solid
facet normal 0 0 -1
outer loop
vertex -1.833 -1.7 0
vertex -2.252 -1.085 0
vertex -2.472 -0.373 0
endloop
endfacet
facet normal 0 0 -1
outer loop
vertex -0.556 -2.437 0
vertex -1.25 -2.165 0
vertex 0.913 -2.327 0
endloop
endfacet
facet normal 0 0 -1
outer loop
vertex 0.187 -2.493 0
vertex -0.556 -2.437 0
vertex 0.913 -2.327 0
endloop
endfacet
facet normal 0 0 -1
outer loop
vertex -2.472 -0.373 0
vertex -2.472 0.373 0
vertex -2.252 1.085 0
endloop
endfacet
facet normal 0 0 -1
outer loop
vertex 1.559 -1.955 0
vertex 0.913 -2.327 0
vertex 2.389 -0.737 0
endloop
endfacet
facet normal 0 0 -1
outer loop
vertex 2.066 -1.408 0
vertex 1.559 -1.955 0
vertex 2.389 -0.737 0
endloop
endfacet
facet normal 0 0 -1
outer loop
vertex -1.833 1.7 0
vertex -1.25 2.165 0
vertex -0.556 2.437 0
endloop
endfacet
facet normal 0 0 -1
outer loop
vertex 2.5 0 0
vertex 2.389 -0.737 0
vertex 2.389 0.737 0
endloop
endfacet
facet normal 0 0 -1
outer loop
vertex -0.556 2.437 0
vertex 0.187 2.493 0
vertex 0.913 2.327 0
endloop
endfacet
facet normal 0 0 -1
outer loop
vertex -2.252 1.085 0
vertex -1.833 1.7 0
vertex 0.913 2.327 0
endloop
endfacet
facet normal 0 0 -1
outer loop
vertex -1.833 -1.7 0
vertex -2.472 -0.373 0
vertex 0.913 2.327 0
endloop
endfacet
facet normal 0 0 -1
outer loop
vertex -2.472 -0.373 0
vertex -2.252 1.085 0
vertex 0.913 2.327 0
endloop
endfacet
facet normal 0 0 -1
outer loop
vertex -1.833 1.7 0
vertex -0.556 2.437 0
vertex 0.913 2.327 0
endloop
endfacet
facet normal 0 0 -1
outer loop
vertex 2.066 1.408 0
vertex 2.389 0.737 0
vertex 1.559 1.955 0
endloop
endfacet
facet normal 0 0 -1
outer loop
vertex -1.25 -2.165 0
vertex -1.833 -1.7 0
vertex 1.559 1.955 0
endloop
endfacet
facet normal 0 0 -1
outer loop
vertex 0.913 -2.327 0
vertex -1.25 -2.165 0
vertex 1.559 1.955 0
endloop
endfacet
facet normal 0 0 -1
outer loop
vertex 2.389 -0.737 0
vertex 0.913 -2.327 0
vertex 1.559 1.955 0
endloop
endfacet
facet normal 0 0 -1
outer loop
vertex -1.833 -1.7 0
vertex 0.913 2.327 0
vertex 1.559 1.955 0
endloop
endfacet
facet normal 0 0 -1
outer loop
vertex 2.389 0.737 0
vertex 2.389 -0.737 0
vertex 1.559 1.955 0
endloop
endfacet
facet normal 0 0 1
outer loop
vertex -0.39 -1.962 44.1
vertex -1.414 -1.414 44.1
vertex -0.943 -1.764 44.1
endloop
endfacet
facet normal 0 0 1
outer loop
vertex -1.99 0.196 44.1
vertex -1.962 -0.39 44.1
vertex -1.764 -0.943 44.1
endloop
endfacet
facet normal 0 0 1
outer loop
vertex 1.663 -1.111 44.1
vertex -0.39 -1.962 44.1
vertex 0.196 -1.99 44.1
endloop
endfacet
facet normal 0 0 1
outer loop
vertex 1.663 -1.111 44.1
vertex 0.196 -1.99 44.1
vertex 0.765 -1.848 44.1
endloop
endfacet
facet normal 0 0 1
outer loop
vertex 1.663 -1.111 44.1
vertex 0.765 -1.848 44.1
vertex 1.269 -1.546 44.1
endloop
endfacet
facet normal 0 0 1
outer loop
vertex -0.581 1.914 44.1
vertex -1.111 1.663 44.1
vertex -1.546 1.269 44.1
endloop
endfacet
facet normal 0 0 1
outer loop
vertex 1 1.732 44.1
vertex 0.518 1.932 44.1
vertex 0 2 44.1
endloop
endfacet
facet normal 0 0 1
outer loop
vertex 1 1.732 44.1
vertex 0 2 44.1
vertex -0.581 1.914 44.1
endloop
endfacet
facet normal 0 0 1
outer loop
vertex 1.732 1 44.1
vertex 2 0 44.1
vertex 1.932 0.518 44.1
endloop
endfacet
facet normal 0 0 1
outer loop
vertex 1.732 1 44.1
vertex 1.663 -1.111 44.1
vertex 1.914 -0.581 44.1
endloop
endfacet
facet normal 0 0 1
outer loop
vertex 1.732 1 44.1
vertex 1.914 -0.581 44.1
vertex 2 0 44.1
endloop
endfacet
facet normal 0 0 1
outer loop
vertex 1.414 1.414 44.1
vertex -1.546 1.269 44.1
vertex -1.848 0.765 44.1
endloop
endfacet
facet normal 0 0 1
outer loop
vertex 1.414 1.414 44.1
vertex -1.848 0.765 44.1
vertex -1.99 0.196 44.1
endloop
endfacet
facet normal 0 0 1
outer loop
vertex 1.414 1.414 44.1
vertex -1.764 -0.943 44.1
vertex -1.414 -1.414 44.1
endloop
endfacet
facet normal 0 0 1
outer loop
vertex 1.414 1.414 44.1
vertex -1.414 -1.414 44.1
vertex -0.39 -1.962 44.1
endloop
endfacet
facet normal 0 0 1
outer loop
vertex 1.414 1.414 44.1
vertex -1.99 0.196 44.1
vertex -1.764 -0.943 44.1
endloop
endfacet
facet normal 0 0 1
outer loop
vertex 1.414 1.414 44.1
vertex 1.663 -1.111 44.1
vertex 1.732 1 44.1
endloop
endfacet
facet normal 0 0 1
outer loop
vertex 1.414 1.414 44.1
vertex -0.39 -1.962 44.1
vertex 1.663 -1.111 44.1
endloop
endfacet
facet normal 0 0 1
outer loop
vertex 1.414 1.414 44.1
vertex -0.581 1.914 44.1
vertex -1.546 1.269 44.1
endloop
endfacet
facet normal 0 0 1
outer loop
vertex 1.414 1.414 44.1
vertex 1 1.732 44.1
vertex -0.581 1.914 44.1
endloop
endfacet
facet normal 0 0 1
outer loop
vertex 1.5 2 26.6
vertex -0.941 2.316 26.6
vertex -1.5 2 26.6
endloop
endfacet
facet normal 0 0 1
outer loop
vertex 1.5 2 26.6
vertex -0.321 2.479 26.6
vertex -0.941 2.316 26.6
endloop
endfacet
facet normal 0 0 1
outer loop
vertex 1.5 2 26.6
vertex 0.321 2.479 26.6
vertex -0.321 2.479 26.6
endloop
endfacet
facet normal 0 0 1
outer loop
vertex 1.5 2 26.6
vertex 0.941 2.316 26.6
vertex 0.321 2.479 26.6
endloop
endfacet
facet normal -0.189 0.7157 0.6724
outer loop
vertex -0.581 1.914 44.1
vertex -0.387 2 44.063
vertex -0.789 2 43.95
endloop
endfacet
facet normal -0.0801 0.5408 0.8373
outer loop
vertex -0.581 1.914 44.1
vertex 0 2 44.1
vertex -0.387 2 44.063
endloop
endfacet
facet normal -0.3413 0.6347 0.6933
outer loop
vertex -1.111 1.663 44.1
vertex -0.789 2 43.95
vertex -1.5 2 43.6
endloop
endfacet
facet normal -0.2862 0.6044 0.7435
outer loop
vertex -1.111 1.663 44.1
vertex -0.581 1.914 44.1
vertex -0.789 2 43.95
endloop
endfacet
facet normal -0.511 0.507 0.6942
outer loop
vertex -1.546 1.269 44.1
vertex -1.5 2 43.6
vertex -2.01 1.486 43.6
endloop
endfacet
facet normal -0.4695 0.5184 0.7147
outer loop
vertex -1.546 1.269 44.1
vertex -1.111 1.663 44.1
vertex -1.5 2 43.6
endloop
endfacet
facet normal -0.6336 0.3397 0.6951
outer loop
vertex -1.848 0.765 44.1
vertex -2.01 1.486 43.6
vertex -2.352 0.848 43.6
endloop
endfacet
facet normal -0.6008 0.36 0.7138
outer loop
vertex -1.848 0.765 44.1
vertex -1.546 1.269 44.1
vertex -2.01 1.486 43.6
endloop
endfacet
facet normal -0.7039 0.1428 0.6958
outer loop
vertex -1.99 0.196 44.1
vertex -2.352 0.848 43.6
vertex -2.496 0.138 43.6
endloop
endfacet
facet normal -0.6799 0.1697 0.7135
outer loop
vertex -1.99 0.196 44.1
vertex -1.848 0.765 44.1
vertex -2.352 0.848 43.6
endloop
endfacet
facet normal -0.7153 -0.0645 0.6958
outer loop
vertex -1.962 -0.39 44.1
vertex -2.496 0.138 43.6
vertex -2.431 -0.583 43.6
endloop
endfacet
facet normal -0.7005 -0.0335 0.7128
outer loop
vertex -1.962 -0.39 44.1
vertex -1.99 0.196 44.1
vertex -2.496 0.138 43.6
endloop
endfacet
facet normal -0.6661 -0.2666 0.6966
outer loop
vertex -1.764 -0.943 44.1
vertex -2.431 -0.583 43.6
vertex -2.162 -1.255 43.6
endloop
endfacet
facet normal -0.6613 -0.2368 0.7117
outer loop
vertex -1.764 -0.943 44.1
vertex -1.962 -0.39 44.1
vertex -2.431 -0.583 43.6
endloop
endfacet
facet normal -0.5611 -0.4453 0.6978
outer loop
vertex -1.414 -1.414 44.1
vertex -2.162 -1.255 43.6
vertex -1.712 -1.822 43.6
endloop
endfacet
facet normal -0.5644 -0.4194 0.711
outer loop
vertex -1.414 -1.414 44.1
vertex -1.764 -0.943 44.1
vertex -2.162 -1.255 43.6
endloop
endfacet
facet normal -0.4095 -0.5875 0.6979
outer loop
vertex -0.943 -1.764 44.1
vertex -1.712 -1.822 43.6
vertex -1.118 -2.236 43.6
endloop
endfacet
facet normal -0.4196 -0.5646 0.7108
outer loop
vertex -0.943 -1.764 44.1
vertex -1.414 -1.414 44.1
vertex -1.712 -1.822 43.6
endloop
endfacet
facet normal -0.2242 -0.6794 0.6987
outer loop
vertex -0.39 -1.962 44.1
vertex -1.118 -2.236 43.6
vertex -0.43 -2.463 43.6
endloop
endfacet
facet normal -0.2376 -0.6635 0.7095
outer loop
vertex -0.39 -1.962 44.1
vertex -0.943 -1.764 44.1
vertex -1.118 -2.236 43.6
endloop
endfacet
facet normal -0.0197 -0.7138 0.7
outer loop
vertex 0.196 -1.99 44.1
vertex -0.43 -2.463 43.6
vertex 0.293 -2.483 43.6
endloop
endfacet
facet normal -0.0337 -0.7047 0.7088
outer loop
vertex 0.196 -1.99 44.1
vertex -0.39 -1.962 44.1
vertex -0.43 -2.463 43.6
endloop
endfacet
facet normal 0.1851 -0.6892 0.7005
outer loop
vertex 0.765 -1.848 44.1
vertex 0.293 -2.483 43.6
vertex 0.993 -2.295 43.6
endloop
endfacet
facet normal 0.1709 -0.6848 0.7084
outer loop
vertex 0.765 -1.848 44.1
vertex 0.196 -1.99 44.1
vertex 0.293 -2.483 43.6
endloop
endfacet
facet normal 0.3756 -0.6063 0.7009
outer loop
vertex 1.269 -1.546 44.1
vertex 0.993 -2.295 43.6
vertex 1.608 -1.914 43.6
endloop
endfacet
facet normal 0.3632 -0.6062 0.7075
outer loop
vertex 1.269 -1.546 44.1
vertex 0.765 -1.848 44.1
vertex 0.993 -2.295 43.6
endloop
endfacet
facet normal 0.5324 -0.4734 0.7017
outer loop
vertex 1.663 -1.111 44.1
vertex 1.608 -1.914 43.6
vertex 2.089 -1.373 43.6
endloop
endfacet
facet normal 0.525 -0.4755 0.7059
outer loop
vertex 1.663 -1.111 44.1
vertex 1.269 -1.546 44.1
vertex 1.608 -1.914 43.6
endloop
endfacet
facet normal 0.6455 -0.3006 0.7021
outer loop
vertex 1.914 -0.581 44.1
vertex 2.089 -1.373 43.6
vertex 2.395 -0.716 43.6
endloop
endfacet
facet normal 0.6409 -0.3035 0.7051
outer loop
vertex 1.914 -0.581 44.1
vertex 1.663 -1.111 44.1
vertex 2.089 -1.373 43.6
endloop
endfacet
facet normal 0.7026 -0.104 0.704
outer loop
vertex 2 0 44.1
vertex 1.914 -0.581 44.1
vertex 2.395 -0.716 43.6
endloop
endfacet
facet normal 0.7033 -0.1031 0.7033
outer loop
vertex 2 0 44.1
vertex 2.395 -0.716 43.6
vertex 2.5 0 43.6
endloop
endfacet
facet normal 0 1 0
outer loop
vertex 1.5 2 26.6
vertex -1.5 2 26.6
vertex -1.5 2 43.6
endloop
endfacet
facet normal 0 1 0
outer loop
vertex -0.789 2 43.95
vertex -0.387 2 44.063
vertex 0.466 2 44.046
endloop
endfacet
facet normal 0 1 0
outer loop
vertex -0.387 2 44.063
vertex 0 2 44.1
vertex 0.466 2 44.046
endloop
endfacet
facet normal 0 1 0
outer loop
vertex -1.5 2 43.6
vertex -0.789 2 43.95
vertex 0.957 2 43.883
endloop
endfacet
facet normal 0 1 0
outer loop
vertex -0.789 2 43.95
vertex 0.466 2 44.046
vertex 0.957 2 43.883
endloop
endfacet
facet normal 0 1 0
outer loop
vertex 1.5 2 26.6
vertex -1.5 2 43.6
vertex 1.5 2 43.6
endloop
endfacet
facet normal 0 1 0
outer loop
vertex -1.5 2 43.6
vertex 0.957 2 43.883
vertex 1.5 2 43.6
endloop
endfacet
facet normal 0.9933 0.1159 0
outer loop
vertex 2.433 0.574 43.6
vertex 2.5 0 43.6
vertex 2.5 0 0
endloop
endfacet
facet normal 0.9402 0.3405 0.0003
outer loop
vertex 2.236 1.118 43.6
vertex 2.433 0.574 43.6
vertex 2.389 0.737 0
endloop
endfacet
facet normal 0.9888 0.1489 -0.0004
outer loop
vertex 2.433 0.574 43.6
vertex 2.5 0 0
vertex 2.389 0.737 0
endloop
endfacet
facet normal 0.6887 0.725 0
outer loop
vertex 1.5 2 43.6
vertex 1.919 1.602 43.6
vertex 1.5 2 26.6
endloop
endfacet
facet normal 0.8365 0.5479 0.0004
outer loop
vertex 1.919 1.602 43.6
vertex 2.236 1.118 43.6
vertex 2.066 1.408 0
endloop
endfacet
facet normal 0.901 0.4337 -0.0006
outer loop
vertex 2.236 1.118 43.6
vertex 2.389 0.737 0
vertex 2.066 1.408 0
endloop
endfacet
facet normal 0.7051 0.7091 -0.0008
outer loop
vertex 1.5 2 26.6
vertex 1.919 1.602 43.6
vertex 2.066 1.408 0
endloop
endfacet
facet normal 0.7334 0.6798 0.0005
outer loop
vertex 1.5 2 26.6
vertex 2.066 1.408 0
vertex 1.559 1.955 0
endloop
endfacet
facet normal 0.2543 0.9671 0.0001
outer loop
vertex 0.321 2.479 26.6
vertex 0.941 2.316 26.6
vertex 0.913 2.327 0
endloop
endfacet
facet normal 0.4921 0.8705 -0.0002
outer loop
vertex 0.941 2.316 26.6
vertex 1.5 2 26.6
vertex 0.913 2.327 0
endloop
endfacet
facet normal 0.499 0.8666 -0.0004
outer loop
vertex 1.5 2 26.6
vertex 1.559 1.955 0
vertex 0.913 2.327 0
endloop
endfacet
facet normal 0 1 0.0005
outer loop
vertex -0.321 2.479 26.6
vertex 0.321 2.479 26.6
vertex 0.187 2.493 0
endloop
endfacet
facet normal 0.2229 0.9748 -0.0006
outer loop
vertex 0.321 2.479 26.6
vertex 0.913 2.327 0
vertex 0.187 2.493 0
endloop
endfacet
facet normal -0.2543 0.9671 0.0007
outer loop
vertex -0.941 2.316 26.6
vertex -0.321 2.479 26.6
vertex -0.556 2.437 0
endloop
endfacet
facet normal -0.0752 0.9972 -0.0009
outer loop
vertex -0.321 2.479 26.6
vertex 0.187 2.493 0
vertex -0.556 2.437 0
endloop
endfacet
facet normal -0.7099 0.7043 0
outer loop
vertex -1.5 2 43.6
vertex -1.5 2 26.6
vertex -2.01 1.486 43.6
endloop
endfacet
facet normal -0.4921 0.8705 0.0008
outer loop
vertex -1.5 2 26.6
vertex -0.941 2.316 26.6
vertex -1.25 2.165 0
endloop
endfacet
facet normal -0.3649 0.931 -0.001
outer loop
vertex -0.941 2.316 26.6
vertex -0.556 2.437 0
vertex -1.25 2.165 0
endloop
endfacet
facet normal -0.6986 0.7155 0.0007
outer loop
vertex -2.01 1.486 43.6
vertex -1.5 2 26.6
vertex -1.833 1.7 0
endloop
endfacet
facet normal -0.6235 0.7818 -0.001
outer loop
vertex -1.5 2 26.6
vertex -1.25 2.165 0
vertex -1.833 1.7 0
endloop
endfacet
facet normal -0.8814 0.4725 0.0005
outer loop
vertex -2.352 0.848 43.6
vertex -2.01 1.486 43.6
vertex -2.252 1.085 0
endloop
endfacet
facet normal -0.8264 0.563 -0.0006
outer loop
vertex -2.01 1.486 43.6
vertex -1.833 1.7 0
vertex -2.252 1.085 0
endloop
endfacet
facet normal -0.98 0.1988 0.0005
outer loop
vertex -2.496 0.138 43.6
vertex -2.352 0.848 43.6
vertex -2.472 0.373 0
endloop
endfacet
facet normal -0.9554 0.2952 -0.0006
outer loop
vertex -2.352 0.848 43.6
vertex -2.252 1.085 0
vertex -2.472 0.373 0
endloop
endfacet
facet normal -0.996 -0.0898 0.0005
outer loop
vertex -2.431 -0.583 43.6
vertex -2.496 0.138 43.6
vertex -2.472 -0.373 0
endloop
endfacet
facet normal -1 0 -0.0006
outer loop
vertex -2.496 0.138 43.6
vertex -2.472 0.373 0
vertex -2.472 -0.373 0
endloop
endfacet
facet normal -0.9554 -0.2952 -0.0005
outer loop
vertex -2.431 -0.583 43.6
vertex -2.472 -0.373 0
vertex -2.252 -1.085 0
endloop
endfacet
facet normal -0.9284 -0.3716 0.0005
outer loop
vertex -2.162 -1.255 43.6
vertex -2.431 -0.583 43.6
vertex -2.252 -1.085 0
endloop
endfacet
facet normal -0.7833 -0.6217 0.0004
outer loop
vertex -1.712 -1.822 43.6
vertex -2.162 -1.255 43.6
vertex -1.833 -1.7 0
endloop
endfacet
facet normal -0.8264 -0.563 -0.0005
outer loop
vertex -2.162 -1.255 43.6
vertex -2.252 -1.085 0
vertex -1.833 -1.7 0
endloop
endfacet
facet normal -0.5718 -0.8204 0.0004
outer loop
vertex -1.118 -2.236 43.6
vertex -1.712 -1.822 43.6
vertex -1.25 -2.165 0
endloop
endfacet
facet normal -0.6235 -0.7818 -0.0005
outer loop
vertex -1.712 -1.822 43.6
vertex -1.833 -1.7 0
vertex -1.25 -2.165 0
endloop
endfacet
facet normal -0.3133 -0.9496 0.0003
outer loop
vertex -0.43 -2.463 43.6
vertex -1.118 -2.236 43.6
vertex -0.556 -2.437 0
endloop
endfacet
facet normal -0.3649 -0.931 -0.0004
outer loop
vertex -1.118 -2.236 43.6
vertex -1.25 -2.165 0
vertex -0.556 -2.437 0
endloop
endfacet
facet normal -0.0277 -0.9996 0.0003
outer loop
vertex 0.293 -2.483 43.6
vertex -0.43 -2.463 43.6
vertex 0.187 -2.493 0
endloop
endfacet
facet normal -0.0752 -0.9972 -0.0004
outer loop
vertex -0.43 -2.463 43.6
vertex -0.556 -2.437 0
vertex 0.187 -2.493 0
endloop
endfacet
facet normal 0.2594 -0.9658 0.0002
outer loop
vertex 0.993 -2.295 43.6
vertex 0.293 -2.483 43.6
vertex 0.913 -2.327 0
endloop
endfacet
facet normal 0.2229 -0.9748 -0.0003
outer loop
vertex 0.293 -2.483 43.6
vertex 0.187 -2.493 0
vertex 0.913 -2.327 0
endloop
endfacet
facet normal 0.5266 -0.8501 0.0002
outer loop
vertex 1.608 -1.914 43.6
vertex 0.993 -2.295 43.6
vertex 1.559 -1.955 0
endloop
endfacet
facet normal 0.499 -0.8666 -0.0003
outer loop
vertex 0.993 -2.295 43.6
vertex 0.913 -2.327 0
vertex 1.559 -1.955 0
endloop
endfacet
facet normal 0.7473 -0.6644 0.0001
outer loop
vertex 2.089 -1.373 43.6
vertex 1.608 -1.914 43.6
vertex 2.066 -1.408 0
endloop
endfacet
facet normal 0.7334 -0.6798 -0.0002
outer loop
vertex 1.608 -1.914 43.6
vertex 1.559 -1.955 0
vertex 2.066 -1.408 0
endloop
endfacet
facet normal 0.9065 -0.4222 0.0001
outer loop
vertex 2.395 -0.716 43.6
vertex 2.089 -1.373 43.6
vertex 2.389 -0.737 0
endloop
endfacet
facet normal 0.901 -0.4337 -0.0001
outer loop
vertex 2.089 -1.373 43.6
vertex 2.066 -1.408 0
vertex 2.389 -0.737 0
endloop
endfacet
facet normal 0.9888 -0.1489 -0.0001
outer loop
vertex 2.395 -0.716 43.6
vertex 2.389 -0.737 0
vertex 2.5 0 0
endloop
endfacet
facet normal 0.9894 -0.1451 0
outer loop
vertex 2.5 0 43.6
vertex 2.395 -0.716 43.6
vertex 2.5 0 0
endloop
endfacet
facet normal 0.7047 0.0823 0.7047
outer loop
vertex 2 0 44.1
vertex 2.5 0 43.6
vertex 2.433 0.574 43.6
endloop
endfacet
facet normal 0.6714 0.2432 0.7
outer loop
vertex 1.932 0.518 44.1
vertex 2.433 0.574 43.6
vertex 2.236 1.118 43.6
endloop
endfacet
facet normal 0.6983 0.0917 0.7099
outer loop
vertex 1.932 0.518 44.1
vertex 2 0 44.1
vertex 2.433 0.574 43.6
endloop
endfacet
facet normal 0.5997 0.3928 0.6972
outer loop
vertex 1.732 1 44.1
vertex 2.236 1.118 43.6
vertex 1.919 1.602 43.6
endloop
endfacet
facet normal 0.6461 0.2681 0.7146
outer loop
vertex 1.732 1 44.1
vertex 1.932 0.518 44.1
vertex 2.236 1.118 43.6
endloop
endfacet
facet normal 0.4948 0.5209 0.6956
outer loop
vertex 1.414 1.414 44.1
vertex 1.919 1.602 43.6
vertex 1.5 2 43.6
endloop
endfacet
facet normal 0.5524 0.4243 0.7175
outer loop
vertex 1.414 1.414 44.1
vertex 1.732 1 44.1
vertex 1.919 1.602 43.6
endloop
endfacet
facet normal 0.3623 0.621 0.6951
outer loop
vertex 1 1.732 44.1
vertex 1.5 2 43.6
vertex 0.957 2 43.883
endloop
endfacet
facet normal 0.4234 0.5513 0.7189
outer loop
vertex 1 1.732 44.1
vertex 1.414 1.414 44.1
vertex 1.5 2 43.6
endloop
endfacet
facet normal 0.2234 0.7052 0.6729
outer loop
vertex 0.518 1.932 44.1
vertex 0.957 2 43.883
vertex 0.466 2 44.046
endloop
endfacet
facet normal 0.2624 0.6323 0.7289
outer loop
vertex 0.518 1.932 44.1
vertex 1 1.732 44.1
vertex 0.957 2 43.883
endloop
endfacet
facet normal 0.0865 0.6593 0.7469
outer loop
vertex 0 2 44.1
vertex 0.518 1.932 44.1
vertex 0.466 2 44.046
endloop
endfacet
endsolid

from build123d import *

# Parameters (mm, degrees)
CROQUIS1_R              = 2.5
SALIENTE_EXTRUIR1_DEPTH = 44.1
REDONDEO1_SIZE          = 0.5
SKETCH_1_W              = 5.27274558
SKETCH_1_H              = 1.959781543
CUT_EXTRUDE_1_DEPTH     = 17.5


with BuildPart() as part:
    # Croquis1 → Saliente-Extruir1 (new body)
    with BuildSketch(Plane.XY):
        Circle(CROQUIS1_R)
    extrude(amount=SALIENTE_EXTRUIR1_DEPTH)

    # Redondeo1
    redondeo1_edges = [part.edges().sort_by_distance(p)[0] for p in [
        (-2.5, 0, 44.1),
    ]]
    chamfer(redondeo1_edges, length=REDONDEO1_SIZE)

    # Эскиз1 → Вырез-Вытянуть1 (cut)
    with BuildSketch(Plane.XY.offset(44.1)):
        with Locations((0.092224381, 2.979890772)):
            Rectangle(SKETCH_1_W, SKETCH_1_H)
    extrude(amount=-CUT_EXTRUDE_1_DEPTH, mode=Mode.SUBTRACT)


solid = part.part
